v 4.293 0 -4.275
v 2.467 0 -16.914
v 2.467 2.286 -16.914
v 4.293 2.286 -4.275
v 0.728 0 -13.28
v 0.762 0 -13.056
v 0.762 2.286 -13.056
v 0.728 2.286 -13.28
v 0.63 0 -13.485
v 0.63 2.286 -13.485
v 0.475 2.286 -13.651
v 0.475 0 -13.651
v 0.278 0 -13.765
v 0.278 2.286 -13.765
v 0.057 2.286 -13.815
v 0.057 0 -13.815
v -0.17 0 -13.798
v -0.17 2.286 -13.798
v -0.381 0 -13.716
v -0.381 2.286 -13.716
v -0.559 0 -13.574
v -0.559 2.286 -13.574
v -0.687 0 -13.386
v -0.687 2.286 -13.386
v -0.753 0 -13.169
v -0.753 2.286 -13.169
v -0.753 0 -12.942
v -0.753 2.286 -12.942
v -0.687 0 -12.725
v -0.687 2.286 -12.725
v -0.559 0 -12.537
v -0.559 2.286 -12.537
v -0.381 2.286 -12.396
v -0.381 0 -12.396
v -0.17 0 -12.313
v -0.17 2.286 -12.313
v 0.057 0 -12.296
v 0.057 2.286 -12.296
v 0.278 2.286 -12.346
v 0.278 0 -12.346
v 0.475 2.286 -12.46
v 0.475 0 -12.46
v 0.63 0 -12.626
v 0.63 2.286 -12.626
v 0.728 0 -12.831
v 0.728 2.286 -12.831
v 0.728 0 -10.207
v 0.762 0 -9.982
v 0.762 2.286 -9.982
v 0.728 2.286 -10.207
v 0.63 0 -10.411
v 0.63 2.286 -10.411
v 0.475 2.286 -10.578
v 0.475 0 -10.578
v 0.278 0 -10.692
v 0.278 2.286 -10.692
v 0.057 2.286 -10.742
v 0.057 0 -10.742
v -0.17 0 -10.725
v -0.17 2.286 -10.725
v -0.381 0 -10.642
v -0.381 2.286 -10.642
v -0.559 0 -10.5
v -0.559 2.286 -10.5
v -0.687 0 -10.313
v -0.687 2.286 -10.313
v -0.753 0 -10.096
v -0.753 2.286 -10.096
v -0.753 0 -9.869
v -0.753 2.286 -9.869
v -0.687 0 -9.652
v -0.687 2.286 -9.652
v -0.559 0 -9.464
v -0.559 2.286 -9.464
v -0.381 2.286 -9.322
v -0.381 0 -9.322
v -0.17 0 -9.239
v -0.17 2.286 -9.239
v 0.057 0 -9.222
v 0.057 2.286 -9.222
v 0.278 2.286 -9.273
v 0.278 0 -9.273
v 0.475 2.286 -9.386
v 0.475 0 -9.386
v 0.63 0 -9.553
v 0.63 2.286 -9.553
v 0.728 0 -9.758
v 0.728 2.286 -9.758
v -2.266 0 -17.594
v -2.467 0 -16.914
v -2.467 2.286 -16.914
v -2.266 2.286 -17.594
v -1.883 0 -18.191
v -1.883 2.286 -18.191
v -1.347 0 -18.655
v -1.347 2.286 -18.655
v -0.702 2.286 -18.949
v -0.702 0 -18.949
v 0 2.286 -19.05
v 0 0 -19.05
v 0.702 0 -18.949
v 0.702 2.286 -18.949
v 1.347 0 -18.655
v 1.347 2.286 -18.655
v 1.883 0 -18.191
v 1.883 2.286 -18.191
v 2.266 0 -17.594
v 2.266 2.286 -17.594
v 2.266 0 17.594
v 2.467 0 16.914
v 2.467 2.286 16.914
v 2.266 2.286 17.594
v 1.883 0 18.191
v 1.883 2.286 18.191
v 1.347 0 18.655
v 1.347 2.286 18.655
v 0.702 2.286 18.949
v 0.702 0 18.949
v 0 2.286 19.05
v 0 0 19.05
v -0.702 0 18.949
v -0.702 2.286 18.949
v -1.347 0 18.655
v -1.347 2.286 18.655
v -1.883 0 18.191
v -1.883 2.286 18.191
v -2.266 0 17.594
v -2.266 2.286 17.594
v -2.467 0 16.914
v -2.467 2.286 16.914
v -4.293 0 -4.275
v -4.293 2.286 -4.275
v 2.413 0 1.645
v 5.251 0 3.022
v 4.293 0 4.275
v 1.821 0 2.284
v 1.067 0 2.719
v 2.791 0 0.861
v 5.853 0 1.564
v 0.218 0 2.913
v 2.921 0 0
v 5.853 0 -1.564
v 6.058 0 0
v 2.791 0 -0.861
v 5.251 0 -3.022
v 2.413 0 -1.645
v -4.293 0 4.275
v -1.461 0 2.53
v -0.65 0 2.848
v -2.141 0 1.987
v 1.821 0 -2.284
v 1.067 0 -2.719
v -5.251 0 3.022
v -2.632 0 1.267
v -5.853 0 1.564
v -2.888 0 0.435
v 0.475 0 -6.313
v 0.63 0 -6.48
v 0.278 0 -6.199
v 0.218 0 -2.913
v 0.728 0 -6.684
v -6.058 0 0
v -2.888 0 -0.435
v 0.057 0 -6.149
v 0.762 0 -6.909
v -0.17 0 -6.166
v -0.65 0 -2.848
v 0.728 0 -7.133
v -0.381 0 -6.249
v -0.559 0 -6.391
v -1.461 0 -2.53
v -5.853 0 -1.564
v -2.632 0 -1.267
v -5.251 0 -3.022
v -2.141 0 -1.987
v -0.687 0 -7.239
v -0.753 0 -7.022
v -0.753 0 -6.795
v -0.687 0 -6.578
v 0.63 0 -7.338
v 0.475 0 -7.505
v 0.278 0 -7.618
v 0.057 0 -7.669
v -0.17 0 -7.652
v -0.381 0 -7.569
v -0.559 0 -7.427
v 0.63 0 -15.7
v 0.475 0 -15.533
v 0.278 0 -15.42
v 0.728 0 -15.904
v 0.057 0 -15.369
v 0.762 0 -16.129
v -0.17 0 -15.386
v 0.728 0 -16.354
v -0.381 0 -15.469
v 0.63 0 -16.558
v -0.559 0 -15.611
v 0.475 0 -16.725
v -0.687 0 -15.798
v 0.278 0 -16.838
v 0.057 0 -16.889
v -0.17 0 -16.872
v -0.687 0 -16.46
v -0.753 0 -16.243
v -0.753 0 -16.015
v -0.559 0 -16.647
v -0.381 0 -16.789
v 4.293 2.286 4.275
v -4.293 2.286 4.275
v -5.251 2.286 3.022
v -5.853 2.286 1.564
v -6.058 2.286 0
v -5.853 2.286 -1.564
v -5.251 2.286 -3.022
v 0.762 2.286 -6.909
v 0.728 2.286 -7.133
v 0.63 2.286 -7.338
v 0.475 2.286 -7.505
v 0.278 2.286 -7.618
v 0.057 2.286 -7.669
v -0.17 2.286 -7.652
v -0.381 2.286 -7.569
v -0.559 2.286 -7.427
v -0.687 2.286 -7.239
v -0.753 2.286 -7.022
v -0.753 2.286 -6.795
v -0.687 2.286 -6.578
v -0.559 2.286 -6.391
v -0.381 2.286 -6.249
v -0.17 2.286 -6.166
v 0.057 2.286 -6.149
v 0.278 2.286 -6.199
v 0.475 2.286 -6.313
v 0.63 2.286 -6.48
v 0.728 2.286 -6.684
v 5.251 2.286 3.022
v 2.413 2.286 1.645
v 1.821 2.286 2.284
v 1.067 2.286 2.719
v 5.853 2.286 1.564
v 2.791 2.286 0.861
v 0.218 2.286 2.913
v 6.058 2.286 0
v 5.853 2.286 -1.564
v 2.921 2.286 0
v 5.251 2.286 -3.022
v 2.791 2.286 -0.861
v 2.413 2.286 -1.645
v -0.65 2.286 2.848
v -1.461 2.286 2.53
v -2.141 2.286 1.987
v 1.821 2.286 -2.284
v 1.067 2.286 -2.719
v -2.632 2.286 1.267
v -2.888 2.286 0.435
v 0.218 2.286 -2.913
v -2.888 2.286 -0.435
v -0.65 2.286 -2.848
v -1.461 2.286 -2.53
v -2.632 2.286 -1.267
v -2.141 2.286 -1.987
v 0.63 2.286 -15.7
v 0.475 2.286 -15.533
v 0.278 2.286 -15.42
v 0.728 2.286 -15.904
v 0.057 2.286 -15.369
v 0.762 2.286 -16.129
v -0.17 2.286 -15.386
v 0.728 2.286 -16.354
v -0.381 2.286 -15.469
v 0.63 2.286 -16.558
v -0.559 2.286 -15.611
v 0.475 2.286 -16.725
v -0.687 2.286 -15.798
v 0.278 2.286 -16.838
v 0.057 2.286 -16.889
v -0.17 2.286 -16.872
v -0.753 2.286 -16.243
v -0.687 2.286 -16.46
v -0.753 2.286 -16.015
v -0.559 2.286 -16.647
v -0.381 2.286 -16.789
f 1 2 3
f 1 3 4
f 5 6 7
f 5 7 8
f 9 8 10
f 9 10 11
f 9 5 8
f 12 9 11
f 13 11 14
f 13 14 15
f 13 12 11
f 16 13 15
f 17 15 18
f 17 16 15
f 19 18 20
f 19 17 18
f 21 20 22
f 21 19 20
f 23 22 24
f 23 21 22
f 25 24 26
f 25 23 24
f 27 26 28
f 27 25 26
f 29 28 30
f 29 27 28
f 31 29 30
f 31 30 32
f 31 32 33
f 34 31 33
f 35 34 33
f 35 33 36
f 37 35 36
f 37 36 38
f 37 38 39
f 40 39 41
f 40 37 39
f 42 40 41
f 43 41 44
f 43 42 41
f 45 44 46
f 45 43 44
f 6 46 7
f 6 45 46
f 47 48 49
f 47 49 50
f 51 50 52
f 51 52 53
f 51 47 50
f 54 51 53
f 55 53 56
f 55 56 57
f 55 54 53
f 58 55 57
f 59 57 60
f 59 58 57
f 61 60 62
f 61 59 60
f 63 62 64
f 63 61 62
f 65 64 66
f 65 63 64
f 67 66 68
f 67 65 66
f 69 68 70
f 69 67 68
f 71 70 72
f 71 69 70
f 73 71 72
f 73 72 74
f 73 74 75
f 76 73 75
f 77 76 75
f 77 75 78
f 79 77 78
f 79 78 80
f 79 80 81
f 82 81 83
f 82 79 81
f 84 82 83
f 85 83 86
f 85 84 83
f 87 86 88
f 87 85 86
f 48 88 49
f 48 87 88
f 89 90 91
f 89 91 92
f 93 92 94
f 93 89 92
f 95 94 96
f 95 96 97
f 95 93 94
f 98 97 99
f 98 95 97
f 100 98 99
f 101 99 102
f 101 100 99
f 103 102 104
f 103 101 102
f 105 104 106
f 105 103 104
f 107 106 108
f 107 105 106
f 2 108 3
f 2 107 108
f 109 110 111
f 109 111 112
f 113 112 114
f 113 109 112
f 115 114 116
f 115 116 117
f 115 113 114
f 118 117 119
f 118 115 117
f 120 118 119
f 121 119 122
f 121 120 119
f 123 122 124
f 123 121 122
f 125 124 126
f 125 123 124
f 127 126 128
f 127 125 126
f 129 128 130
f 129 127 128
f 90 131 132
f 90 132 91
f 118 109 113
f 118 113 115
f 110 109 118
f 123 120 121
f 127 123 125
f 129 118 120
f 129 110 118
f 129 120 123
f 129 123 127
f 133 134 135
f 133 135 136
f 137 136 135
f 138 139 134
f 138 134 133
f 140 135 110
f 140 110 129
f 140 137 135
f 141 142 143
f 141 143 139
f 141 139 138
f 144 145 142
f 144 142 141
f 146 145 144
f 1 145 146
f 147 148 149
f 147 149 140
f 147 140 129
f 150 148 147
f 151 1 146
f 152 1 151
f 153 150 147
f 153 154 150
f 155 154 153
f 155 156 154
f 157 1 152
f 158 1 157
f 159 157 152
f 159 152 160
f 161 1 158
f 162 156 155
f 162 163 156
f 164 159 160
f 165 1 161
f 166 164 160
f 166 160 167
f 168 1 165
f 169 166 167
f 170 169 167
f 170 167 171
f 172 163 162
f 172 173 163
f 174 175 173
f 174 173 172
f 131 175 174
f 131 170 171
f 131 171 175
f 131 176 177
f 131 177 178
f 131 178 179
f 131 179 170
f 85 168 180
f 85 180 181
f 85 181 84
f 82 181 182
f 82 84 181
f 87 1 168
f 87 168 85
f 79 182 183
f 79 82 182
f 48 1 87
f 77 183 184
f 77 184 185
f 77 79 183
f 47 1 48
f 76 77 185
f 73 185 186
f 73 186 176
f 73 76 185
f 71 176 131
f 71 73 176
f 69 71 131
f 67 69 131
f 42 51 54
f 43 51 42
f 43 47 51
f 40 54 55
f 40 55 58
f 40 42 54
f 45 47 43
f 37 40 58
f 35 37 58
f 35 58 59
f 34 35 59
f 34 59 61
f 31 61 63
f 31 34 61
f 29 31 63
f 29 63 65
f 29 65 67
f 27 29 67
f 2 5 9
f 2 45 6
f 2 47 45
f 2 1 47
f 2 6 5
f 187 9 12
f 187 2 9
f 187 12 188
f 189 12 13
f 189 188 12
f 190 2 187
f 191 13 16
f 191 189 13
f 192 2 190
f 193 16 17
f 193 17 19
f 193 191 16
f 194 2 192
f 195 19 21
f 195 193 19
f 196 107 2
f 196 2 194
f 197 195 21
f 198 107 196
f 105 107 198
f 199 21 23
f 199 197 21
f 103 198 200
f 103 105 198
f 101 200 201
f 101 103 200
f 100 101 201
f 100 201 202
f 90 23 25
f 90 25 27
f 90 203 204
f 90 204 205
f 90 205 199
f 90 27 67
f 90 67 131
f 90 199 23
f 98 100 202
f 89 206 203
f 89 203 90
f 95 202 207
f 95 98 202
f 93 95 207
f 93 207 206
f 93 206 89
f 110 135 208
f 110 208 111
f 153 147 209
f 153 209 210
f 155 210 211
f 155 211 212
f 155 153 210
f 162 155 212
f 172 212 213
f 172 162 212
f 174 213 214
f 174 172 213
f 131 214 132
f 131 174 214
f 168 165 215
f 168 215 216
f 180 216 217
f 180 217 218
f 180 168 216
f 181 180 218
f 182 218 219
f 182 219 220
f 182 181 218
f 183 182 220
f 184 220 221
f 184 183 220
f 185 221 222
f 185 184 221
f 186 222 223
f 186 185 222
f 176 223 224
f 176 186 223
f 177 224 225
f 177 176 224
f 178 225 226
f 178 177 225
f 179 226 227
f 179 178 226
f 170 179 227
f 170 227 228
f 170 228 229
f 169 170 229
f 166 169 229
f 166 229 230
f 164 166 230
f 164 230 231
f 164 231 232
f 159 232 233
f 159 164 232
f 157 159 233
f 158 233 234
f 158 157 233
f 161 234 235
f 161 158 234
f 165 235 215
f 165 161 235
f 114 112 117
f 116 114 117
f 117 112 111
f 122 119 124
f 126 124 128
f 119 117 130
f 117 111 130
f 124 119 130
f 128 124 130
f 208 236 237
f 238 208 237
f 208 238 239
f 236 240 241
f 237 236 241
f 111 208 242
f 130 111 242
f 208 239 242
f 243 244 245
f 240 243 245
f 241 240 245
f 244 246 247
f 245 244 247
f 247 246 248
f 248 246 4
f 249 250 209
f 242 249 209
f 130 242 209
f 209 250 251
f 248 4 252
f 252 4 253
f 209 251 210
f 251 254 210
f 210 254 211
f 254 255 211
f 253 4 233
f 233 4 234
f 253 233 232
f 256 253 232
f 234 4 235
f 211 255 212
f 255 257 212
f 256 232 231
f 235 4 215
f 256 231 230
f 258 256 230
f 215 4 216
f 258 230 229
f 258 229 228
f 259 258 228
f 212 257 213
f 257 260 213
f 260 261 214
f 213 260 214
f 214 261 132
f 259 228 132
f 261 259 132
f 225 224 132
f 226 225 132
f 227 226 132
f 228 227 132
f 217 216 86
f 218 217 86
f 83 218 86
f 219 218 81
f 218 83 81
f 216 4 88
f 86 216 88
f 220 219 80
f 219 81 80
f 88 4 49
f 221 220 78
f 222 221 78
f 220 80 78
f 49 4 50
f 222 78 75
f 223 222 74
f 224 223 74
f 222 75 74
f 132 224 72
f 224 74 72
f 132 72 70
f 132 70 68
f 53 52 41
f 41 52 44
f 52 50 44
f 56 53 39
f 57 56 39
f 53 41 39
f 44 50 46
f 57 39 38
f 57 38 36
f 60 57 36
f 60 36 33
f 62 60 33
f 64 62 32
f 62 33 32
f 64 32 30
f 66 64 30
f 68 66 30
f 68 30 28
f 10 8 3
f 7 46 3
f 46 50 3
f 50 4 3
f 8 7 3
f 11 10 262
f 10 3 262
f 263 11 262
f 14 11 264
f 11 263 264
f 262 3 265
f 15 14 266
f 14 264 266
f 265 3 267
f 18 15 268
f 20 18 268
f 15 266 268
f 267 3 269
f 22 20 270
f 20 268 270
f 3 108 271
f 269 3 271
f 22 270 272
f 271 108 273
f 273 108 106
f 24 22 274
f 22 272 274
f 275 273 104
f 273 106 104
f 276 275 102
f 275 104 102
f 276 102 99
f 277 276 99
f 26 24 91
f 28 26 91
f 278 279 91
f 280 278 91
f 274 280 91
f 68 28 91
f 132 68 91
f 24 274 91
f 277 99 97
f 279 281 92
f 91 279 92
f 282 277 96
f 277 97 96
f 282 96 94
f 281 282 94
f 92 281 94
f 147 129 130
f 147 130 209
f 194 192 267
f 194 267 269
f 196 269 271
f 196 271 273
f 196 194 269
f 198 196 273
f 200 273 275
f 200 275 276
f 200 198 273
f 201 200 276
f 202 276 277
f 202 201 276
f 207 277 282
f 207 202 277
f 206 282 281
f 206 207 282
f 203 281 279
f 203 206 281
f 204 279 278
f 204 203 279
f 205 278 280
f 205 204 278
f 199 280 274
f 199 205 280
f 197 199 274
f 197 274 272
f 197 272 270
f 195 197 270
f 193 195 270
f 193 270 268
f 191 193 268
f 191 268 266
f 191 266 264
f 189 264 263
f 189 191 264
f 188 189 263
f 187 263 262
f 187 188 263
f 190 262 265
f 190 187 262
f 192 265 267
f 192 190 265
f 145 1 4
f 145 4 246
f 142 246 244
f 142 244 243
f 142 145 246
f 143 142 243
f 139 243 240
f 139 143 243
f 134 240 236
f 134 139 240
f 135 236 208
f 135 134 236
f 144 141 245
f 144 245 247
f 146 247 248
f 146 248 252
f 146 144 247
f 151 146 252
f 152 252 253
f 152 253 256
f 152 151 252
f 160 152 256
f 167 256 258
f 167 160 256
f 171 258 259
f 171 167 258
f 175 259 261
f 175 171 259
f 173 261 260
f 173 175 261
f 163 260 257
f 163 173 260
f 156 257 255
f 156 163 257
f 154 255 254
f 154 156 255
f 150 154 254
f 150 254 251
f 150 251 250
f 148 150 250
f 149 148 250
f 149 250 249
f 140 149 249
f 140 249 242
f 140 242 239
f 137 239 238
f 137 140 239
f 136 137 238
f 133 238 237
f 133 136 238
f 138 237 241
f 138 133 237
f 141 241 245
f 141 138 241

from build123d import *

# Parameters (mm, degrees)
SKETCH1_R           = 2.921
SKETCH1_R_2         = 0.762
BOSS_EXTRUDE1_DEPTH = 2.286


with BuildPart() as part:
    # Sketch1 → Boss-Extrude1 (new body)
    with BuildSketch(Plane(origin=(0, 0, 0), x_dir=(1, 0, 0), z_dir=(0, 1, 0))):
        with BuildLine():
            Line((-4.2926, 4.274545315), (-2.466531309, 16.914204067))
            ThreePointArc((-2.466531309, 16.914204067), (0, 19.05), (2.466531309, 16.914204067))
            Line((2.466531309, 16.914204067), (4.2926, 4.274545315))
            ThreePointArc((4.2926, 4.274545315), (6.0579, 0), (4.2926, -4.274545315))
            Line((4.2926, -4.274545315), (2.466531309, -16.914204067))
            ThreePointArc((2.466531309, -16.914204067), (0, -19.05), (-2.466531309, -16.914204067))
            Line((-2.466531309, -16.914204067), (-4.2926, -4.274545315))
            ThreePointArc((-4.2926, -4.274545315), (-6.0579, 0), (-4.2926, 4.274545315))
        make_face()
        Circle(SKETCH1_R, mode=Mode.SUBTRACT)
        with Locations((0, 16.129)):
            Circle(SKETCH1_R_2, mode=Mode.SUBTRACT)
        with Locations((0, 13.0556)):
            Circle(SKETCH1_R_2, mode=Mode.SUBTRACT)
        with Locations((0, 9.9822)):
            Circle(SKETCH1_R_2, mode=Mode.SUBTRACT)
        with Locations((0, 6.9088)):
            Circle(SKETCH1_R_2, mode=Mode.SUBTRACT)
    extrude(amount=BOSS_EXTRUDE1_DEPTH)


solid = part.part
